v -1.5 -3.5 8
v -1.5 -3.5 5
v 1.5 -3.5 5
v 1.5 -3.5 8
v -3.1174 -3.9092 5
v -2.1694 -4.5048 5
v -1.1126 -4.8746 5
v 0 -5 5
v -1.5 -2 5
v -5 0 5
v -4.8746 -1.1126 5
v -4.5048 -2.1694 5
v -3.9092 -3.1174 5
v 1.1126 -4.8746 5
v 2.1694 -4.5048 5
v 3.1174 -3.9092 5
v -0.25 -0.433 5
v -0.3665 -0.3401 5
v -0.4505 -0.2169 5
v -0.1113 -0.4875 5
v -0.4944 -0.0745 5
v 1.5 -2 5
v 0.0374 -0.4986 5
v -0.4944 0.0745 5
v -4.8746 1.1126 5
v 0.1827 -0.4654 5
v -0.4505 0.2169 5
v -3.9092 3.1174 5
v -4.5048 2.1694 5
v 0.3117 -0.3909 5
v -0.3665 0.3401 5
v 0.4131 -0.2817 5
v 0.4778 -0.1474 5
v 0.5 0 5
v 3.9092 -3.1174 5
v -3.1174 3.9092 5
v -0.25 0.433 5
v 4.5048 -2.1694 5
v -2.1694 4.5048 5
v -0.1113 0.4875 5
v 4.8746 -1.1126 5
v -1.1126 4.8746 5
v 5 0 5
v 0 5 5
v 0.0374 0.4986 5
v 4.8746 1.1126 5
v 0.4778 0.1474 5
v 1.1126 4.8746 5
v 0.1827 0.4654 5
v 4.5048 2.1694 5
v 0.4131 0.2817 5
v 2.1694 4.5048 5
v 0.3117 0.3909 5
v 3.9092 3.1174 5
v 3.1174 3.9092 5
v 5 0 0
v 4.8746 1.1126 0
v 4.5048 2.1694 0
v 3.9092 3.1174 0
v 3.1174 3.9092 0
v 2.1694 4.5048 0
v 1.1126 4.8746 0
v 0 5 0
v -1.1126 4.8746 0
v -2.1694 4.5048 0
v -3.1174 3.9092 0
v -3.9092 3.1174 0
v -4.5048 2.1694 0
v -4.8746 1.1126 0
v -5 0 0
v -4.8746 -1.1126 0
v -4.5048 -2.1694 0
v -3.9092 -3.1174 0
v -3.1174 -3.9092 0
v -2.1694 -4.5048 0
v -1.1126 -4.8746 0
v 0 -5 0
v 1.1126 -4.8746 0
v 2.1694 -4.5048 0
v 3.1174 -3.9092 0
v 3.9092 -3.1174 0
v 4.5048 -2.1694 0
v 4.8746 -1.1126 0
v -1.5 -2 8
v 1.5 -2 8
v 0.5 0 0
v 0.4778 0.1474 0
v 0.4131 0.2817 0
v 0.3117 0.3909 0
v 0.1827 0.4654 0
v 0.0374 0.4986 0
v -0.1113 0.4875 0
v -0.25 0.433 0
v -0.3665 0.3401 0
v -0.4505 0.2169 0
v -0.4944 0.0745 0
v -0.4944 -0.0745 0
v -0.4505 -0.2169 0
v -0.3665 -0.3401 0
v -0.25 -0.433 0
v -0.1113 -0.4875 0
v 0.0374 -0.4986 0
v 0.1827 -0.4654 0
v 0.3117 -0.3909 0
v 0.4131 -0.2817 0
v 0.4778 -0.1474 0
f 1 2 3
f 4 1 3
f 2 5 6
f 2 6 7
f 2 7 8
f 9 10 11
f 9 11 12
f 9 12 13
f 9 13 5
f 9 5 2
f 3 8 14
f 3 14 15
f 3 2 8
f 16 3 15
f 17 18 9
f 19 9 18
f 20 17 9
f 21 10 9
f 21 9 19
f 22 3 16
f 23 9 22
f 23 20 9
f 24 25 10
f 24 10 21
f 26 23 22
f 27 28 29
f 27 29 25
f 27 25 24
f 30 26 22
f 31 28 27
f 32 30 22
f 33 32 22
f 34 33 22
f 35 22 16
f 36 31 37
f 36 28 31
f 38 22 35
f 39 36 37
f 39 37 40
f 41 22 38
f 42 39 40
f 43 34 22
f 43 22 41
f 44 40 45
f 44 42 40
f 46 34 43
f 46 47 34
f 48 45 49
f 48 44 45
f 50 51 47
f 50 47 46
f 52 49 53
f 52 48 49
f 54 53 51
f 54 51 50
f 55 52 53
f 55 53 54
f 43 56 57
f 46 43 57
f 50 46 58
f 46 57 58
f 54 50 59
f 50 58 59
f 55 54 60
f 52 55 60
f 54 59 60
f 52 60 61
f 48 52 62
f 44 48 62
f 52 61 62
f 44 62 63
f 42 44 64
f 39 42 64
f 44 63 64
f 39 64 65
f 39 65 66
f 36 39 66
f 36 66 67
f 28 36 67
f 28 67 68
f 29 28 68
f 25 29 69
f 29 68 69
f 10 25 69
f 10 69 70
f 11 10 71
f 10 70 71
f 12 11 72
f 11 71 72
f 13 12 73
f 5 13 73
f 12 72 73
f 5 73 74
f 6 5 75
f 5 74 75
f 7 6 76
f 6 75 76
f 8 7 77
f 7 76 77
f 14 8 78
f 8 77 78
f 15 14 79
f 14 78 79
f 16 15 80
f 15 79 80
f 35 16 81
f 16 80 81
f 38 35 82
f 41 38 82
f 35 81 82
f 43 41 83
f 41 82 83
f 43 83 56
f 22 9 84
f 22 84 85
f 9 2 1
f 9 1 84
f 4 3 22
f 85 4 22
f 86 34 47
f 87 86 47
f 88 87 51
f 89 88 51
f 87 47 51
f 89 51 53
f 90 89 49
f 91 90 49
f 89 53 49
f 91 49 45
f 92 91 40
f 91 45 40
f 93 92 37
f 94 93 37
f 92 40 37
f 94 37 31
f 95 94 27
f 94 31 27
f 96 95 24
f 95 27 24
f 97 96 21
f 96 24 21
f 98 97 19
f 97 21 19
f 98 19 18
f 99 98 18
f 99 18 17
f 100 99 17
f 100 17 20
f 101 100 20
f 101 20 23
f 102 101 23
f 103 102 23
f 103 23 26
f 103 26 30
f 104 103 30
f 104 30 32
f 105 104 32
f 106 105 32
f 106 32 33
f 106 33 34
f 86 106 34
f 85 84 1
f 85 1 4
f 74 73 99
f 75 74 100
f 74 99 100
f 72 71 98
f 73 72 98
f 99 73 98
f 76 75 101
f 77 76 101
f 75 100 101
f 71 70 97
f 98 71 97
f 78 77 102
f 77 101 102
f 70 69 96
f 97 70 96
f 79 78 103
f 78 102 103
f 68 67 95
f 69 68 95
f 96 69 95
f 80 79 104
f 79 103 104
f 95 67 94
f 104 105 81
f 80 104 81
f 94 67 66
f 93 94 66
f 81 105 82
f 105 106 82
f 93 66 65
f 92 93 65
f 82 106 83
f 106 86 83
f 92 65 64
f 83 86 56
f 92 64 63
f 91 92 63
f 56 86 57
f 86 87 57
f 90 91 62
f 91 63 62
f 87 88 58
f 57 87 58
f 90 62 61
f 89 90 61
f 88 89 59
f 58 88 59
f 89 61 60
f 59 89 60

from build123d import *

# Parameters (mm, degrees)
F0_R     = 5
F1_DEPTH = 5
F2_W     = 3
F2_H     = 1.5
F3_DEPTH = 3
F4_R     = 0.5
F5_DEPTH = 25


with BuildPart() as f1:
    # F0 (on Top) → F1 (new body)
    with BuildSketch(Plane.XY):
        Circle(F0_R)
    extrude(amount=F1_DEPTH)

    # F2 (on face) → F3 (join)
    with BuildSketch(Plane.XY.offset(5)):
        with Locations((0, -2.75)):
            Rectangle(F2_W, F2_H)
    extrude(amount=F3_DEPTH)

    # F4 (on face) → F5 (cut)
    with BuildSketch(Plane.XY.offset(5)):
        Circle(F4_R)
    extrude(amount=-F5_DEPTH, mode=Mode.SUBTRACT)


solid = f1.part
